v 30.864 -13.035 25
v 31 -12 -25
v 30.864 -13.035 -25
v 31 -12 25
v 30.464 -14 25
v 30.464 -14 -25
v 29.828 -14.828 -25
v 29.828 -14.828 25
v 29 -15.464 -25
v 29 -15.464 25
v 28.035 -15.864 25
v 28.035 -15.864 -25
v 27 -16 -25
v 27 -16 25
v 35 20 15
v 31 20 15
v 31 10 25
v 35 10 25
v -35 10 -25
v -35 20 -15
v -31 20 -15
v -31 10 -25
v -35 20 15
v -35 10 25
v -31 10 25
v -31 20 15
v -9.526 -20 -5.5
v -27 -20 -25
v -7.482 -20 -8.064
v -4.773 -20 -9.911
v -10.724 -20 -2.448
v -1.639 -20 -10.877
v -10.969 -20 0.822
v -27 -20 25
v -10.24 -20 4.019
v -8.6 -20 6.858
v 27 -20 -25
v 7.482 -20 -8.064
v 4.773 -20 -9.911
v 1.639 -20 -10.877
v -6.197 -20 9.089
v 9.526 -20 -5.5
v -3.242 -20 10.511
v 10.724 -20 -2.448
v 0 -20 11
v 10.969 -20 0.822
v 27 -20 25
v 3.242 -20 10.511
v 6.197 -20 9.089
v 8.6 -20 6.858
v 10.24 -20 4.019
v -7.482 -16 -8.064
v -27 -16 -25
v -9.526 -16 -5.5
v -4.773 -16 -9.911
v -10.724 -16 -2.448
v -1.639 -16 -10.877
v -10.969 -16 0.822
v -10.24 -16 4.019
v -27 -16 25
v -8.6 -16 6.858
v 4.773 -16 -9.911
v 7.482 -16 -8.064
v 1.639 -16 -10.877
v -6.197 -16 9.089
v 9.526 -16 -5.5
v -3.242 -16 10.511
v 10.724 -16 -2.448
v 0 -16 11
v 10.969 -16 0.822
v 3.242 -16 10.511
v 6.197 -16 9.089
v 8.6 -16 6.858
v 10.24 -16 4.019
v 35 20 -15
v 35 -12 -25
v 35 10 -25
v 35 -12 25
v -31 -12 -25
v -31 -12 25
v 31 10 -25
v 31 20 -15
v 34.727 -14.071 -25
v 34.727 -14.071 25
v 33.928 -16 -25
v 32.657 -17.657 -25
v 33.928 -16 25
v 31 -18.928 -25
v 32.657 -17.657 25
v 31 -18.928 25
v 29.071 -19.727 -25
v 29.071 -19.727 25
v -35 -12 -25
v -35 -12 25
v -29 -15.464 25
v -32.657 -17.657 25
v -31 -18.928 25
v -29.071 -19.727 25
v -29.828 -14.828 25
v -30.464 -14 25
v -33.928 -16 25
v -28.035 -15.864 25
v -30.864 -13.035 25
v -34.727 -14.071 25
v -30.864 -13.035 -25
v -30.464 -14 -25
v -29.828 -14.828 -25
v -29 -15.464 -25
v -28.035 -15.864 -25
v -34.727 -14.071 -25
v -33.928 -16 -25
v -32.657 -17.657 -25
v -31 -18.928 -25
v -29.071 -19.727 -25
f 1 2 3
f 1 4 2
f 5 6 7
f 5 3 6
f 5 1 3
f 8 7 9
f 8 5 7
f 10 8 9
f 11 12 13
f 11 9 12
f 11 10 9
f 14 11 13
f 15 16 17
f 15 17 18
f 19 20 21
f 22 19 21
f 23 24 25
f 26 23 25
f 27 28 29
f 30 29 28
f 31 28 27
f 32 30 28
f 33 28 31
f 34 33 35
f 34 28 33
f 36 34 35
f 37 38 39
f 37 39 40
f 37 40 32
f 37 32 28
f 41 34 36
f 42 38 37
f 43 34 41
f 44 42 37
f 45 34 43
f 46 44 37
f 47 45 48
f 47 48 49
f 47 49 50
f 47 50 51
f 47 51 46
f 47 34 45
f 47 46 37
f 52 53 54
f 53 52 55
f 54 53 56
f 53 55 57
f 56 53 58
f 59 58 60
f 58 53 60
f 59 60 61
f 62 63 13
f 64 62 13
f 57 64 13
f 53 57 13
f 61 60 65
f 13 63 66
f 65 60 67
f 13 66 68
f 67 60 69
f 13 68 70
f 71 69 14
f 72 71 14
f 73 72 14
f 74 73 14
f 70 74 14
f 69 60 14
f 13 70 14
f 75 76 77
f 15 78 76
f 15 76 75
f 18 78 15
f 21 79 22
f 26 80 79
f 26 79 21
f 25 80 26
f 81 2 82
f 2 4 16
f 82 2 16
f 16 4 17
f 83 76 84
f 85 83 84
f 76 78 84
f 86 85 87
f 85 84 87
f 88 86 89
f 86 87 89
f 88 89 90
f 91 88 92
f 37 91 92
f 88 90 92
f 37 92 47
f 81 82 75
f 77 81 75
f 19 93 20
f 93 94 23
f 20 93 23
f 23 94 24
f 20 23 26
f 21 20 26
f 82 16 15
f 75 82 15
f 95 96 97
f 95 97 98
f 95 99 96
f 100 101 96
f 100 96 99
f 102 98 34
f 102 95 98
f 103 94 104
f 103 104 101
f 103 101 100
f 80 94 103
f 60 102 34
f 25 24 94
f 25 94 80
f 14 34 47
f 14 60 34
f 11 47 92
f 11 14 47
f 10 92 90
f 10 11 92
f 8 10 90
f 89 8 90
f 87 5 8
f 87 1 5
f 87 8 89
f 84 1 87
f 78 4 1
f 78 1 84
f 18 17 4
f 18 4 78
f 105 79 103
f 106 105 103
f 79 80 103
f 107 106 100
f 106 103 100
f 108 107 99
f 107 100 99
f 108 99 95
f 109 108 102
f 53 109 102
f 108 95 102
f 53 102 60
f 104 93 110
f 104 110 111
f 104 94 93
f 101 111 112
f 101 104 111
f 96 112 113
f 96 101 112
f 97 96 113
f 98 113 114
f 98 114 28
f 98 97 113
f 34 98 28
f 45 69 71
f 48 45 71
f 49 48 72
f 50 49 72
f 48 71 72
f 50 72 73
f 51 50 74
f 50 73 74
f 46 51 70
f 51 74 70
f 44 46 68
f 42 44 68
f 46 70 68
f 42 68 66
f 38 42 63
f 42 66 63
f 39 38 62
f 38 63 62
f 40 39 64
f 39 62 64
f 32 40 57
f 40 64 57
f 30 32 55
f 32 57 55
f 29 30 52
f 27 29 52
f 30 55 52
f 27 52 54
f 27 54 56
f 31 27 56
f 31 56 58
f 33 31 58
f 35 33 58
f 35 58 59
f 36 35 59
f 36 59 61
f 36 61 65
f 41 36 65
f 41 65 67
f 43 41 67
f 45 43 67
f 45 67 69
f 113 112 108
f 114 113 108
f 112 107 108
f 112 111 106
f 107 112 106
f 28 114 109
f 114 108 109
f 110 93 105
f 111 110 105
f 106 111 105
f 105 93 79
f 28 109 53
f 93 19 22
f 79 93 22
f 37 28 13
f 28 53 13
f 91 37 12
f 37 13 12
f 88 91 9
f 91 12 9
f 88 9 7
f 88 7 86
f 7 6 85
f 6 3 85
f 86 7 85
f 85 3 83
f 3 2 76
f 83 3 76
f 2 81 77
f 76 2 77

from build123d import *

# Parameters (mm, degrees)
SKETCH1_W           = 70
SKETCH1_H           = 40
BOSS_EXTRUDE1_DEPTH = 25
FILLET1_R           = 8
SHELL1_T            = -4
CHAMFER1_SIZE       = 10
CUT_EXTRUDE1_REACH  = 58.089
SKETCH2_R           = 11


with BuildPart() as part:
    # Sketch1 → Boss-Extrude1 (new, symmetric)
    with BuildSketch(Plane.XY):
        Rectangle(SKETCH1_W, SKETCH1_H)
    extrude(amount=BOSS_EXTRUDE1_DEPTH, both=True)

    # Fillet1
    fillet1_edges = [part.edges().sort_by_distance(p)[0] for p in [
        (35, -20, 0),
        (-35, -20, 0),
    ]]
    fillet(fillet1_edges, radius=FILLET1_R)

    # Shell1
    shell1_openings = [part.faces().sort_by_distance(p)[0] for p in [
        (0, 0.180447069, 25),
        (0, 0.180447069, -25),
        (0, 20, 0),
    ]]
    offset(amount=SHELL1_T, openings=shell1_openings, kind=Kind.INTERSECTION)

    # Chamfer1
    chamfer1_edges = [part.edges().sort_by_distance(p)[0] for p in [
        (-33, 20, -25),
        (-33, 20, 25),
        (33, 20, -25),
        (33, 20, 25),
    ]]
    chamfer(chamfer1_edges, length=CHAMFER1_SIZE)

    # Sketch2 → Cut-Extrude1 (cut, up to next)
    with BuildSketch(Plane(origin=(0, -16, 0), x_dir=(1, 0, 0), z_dir=(0, 1, 0)), mode=Mode.PRIVATE) as cut_extrude1_sk1:
        with Locations(Location((0, 0, 0), (0, 0, 270))):
            Circle(SKETCH2_R)
    cut_extrude1_tool1 = extrude(cut_extrude1_sk1.sketch, amount=-CUT_EXTRUDE1_REACH, mode=Mode.PRIVATE) & part.part
    add(cut_extrude1_tool1.solids().sort_by_distance((0, -16, 0))[0], mode=Mode.SUBTRACT)


solid = part.part
